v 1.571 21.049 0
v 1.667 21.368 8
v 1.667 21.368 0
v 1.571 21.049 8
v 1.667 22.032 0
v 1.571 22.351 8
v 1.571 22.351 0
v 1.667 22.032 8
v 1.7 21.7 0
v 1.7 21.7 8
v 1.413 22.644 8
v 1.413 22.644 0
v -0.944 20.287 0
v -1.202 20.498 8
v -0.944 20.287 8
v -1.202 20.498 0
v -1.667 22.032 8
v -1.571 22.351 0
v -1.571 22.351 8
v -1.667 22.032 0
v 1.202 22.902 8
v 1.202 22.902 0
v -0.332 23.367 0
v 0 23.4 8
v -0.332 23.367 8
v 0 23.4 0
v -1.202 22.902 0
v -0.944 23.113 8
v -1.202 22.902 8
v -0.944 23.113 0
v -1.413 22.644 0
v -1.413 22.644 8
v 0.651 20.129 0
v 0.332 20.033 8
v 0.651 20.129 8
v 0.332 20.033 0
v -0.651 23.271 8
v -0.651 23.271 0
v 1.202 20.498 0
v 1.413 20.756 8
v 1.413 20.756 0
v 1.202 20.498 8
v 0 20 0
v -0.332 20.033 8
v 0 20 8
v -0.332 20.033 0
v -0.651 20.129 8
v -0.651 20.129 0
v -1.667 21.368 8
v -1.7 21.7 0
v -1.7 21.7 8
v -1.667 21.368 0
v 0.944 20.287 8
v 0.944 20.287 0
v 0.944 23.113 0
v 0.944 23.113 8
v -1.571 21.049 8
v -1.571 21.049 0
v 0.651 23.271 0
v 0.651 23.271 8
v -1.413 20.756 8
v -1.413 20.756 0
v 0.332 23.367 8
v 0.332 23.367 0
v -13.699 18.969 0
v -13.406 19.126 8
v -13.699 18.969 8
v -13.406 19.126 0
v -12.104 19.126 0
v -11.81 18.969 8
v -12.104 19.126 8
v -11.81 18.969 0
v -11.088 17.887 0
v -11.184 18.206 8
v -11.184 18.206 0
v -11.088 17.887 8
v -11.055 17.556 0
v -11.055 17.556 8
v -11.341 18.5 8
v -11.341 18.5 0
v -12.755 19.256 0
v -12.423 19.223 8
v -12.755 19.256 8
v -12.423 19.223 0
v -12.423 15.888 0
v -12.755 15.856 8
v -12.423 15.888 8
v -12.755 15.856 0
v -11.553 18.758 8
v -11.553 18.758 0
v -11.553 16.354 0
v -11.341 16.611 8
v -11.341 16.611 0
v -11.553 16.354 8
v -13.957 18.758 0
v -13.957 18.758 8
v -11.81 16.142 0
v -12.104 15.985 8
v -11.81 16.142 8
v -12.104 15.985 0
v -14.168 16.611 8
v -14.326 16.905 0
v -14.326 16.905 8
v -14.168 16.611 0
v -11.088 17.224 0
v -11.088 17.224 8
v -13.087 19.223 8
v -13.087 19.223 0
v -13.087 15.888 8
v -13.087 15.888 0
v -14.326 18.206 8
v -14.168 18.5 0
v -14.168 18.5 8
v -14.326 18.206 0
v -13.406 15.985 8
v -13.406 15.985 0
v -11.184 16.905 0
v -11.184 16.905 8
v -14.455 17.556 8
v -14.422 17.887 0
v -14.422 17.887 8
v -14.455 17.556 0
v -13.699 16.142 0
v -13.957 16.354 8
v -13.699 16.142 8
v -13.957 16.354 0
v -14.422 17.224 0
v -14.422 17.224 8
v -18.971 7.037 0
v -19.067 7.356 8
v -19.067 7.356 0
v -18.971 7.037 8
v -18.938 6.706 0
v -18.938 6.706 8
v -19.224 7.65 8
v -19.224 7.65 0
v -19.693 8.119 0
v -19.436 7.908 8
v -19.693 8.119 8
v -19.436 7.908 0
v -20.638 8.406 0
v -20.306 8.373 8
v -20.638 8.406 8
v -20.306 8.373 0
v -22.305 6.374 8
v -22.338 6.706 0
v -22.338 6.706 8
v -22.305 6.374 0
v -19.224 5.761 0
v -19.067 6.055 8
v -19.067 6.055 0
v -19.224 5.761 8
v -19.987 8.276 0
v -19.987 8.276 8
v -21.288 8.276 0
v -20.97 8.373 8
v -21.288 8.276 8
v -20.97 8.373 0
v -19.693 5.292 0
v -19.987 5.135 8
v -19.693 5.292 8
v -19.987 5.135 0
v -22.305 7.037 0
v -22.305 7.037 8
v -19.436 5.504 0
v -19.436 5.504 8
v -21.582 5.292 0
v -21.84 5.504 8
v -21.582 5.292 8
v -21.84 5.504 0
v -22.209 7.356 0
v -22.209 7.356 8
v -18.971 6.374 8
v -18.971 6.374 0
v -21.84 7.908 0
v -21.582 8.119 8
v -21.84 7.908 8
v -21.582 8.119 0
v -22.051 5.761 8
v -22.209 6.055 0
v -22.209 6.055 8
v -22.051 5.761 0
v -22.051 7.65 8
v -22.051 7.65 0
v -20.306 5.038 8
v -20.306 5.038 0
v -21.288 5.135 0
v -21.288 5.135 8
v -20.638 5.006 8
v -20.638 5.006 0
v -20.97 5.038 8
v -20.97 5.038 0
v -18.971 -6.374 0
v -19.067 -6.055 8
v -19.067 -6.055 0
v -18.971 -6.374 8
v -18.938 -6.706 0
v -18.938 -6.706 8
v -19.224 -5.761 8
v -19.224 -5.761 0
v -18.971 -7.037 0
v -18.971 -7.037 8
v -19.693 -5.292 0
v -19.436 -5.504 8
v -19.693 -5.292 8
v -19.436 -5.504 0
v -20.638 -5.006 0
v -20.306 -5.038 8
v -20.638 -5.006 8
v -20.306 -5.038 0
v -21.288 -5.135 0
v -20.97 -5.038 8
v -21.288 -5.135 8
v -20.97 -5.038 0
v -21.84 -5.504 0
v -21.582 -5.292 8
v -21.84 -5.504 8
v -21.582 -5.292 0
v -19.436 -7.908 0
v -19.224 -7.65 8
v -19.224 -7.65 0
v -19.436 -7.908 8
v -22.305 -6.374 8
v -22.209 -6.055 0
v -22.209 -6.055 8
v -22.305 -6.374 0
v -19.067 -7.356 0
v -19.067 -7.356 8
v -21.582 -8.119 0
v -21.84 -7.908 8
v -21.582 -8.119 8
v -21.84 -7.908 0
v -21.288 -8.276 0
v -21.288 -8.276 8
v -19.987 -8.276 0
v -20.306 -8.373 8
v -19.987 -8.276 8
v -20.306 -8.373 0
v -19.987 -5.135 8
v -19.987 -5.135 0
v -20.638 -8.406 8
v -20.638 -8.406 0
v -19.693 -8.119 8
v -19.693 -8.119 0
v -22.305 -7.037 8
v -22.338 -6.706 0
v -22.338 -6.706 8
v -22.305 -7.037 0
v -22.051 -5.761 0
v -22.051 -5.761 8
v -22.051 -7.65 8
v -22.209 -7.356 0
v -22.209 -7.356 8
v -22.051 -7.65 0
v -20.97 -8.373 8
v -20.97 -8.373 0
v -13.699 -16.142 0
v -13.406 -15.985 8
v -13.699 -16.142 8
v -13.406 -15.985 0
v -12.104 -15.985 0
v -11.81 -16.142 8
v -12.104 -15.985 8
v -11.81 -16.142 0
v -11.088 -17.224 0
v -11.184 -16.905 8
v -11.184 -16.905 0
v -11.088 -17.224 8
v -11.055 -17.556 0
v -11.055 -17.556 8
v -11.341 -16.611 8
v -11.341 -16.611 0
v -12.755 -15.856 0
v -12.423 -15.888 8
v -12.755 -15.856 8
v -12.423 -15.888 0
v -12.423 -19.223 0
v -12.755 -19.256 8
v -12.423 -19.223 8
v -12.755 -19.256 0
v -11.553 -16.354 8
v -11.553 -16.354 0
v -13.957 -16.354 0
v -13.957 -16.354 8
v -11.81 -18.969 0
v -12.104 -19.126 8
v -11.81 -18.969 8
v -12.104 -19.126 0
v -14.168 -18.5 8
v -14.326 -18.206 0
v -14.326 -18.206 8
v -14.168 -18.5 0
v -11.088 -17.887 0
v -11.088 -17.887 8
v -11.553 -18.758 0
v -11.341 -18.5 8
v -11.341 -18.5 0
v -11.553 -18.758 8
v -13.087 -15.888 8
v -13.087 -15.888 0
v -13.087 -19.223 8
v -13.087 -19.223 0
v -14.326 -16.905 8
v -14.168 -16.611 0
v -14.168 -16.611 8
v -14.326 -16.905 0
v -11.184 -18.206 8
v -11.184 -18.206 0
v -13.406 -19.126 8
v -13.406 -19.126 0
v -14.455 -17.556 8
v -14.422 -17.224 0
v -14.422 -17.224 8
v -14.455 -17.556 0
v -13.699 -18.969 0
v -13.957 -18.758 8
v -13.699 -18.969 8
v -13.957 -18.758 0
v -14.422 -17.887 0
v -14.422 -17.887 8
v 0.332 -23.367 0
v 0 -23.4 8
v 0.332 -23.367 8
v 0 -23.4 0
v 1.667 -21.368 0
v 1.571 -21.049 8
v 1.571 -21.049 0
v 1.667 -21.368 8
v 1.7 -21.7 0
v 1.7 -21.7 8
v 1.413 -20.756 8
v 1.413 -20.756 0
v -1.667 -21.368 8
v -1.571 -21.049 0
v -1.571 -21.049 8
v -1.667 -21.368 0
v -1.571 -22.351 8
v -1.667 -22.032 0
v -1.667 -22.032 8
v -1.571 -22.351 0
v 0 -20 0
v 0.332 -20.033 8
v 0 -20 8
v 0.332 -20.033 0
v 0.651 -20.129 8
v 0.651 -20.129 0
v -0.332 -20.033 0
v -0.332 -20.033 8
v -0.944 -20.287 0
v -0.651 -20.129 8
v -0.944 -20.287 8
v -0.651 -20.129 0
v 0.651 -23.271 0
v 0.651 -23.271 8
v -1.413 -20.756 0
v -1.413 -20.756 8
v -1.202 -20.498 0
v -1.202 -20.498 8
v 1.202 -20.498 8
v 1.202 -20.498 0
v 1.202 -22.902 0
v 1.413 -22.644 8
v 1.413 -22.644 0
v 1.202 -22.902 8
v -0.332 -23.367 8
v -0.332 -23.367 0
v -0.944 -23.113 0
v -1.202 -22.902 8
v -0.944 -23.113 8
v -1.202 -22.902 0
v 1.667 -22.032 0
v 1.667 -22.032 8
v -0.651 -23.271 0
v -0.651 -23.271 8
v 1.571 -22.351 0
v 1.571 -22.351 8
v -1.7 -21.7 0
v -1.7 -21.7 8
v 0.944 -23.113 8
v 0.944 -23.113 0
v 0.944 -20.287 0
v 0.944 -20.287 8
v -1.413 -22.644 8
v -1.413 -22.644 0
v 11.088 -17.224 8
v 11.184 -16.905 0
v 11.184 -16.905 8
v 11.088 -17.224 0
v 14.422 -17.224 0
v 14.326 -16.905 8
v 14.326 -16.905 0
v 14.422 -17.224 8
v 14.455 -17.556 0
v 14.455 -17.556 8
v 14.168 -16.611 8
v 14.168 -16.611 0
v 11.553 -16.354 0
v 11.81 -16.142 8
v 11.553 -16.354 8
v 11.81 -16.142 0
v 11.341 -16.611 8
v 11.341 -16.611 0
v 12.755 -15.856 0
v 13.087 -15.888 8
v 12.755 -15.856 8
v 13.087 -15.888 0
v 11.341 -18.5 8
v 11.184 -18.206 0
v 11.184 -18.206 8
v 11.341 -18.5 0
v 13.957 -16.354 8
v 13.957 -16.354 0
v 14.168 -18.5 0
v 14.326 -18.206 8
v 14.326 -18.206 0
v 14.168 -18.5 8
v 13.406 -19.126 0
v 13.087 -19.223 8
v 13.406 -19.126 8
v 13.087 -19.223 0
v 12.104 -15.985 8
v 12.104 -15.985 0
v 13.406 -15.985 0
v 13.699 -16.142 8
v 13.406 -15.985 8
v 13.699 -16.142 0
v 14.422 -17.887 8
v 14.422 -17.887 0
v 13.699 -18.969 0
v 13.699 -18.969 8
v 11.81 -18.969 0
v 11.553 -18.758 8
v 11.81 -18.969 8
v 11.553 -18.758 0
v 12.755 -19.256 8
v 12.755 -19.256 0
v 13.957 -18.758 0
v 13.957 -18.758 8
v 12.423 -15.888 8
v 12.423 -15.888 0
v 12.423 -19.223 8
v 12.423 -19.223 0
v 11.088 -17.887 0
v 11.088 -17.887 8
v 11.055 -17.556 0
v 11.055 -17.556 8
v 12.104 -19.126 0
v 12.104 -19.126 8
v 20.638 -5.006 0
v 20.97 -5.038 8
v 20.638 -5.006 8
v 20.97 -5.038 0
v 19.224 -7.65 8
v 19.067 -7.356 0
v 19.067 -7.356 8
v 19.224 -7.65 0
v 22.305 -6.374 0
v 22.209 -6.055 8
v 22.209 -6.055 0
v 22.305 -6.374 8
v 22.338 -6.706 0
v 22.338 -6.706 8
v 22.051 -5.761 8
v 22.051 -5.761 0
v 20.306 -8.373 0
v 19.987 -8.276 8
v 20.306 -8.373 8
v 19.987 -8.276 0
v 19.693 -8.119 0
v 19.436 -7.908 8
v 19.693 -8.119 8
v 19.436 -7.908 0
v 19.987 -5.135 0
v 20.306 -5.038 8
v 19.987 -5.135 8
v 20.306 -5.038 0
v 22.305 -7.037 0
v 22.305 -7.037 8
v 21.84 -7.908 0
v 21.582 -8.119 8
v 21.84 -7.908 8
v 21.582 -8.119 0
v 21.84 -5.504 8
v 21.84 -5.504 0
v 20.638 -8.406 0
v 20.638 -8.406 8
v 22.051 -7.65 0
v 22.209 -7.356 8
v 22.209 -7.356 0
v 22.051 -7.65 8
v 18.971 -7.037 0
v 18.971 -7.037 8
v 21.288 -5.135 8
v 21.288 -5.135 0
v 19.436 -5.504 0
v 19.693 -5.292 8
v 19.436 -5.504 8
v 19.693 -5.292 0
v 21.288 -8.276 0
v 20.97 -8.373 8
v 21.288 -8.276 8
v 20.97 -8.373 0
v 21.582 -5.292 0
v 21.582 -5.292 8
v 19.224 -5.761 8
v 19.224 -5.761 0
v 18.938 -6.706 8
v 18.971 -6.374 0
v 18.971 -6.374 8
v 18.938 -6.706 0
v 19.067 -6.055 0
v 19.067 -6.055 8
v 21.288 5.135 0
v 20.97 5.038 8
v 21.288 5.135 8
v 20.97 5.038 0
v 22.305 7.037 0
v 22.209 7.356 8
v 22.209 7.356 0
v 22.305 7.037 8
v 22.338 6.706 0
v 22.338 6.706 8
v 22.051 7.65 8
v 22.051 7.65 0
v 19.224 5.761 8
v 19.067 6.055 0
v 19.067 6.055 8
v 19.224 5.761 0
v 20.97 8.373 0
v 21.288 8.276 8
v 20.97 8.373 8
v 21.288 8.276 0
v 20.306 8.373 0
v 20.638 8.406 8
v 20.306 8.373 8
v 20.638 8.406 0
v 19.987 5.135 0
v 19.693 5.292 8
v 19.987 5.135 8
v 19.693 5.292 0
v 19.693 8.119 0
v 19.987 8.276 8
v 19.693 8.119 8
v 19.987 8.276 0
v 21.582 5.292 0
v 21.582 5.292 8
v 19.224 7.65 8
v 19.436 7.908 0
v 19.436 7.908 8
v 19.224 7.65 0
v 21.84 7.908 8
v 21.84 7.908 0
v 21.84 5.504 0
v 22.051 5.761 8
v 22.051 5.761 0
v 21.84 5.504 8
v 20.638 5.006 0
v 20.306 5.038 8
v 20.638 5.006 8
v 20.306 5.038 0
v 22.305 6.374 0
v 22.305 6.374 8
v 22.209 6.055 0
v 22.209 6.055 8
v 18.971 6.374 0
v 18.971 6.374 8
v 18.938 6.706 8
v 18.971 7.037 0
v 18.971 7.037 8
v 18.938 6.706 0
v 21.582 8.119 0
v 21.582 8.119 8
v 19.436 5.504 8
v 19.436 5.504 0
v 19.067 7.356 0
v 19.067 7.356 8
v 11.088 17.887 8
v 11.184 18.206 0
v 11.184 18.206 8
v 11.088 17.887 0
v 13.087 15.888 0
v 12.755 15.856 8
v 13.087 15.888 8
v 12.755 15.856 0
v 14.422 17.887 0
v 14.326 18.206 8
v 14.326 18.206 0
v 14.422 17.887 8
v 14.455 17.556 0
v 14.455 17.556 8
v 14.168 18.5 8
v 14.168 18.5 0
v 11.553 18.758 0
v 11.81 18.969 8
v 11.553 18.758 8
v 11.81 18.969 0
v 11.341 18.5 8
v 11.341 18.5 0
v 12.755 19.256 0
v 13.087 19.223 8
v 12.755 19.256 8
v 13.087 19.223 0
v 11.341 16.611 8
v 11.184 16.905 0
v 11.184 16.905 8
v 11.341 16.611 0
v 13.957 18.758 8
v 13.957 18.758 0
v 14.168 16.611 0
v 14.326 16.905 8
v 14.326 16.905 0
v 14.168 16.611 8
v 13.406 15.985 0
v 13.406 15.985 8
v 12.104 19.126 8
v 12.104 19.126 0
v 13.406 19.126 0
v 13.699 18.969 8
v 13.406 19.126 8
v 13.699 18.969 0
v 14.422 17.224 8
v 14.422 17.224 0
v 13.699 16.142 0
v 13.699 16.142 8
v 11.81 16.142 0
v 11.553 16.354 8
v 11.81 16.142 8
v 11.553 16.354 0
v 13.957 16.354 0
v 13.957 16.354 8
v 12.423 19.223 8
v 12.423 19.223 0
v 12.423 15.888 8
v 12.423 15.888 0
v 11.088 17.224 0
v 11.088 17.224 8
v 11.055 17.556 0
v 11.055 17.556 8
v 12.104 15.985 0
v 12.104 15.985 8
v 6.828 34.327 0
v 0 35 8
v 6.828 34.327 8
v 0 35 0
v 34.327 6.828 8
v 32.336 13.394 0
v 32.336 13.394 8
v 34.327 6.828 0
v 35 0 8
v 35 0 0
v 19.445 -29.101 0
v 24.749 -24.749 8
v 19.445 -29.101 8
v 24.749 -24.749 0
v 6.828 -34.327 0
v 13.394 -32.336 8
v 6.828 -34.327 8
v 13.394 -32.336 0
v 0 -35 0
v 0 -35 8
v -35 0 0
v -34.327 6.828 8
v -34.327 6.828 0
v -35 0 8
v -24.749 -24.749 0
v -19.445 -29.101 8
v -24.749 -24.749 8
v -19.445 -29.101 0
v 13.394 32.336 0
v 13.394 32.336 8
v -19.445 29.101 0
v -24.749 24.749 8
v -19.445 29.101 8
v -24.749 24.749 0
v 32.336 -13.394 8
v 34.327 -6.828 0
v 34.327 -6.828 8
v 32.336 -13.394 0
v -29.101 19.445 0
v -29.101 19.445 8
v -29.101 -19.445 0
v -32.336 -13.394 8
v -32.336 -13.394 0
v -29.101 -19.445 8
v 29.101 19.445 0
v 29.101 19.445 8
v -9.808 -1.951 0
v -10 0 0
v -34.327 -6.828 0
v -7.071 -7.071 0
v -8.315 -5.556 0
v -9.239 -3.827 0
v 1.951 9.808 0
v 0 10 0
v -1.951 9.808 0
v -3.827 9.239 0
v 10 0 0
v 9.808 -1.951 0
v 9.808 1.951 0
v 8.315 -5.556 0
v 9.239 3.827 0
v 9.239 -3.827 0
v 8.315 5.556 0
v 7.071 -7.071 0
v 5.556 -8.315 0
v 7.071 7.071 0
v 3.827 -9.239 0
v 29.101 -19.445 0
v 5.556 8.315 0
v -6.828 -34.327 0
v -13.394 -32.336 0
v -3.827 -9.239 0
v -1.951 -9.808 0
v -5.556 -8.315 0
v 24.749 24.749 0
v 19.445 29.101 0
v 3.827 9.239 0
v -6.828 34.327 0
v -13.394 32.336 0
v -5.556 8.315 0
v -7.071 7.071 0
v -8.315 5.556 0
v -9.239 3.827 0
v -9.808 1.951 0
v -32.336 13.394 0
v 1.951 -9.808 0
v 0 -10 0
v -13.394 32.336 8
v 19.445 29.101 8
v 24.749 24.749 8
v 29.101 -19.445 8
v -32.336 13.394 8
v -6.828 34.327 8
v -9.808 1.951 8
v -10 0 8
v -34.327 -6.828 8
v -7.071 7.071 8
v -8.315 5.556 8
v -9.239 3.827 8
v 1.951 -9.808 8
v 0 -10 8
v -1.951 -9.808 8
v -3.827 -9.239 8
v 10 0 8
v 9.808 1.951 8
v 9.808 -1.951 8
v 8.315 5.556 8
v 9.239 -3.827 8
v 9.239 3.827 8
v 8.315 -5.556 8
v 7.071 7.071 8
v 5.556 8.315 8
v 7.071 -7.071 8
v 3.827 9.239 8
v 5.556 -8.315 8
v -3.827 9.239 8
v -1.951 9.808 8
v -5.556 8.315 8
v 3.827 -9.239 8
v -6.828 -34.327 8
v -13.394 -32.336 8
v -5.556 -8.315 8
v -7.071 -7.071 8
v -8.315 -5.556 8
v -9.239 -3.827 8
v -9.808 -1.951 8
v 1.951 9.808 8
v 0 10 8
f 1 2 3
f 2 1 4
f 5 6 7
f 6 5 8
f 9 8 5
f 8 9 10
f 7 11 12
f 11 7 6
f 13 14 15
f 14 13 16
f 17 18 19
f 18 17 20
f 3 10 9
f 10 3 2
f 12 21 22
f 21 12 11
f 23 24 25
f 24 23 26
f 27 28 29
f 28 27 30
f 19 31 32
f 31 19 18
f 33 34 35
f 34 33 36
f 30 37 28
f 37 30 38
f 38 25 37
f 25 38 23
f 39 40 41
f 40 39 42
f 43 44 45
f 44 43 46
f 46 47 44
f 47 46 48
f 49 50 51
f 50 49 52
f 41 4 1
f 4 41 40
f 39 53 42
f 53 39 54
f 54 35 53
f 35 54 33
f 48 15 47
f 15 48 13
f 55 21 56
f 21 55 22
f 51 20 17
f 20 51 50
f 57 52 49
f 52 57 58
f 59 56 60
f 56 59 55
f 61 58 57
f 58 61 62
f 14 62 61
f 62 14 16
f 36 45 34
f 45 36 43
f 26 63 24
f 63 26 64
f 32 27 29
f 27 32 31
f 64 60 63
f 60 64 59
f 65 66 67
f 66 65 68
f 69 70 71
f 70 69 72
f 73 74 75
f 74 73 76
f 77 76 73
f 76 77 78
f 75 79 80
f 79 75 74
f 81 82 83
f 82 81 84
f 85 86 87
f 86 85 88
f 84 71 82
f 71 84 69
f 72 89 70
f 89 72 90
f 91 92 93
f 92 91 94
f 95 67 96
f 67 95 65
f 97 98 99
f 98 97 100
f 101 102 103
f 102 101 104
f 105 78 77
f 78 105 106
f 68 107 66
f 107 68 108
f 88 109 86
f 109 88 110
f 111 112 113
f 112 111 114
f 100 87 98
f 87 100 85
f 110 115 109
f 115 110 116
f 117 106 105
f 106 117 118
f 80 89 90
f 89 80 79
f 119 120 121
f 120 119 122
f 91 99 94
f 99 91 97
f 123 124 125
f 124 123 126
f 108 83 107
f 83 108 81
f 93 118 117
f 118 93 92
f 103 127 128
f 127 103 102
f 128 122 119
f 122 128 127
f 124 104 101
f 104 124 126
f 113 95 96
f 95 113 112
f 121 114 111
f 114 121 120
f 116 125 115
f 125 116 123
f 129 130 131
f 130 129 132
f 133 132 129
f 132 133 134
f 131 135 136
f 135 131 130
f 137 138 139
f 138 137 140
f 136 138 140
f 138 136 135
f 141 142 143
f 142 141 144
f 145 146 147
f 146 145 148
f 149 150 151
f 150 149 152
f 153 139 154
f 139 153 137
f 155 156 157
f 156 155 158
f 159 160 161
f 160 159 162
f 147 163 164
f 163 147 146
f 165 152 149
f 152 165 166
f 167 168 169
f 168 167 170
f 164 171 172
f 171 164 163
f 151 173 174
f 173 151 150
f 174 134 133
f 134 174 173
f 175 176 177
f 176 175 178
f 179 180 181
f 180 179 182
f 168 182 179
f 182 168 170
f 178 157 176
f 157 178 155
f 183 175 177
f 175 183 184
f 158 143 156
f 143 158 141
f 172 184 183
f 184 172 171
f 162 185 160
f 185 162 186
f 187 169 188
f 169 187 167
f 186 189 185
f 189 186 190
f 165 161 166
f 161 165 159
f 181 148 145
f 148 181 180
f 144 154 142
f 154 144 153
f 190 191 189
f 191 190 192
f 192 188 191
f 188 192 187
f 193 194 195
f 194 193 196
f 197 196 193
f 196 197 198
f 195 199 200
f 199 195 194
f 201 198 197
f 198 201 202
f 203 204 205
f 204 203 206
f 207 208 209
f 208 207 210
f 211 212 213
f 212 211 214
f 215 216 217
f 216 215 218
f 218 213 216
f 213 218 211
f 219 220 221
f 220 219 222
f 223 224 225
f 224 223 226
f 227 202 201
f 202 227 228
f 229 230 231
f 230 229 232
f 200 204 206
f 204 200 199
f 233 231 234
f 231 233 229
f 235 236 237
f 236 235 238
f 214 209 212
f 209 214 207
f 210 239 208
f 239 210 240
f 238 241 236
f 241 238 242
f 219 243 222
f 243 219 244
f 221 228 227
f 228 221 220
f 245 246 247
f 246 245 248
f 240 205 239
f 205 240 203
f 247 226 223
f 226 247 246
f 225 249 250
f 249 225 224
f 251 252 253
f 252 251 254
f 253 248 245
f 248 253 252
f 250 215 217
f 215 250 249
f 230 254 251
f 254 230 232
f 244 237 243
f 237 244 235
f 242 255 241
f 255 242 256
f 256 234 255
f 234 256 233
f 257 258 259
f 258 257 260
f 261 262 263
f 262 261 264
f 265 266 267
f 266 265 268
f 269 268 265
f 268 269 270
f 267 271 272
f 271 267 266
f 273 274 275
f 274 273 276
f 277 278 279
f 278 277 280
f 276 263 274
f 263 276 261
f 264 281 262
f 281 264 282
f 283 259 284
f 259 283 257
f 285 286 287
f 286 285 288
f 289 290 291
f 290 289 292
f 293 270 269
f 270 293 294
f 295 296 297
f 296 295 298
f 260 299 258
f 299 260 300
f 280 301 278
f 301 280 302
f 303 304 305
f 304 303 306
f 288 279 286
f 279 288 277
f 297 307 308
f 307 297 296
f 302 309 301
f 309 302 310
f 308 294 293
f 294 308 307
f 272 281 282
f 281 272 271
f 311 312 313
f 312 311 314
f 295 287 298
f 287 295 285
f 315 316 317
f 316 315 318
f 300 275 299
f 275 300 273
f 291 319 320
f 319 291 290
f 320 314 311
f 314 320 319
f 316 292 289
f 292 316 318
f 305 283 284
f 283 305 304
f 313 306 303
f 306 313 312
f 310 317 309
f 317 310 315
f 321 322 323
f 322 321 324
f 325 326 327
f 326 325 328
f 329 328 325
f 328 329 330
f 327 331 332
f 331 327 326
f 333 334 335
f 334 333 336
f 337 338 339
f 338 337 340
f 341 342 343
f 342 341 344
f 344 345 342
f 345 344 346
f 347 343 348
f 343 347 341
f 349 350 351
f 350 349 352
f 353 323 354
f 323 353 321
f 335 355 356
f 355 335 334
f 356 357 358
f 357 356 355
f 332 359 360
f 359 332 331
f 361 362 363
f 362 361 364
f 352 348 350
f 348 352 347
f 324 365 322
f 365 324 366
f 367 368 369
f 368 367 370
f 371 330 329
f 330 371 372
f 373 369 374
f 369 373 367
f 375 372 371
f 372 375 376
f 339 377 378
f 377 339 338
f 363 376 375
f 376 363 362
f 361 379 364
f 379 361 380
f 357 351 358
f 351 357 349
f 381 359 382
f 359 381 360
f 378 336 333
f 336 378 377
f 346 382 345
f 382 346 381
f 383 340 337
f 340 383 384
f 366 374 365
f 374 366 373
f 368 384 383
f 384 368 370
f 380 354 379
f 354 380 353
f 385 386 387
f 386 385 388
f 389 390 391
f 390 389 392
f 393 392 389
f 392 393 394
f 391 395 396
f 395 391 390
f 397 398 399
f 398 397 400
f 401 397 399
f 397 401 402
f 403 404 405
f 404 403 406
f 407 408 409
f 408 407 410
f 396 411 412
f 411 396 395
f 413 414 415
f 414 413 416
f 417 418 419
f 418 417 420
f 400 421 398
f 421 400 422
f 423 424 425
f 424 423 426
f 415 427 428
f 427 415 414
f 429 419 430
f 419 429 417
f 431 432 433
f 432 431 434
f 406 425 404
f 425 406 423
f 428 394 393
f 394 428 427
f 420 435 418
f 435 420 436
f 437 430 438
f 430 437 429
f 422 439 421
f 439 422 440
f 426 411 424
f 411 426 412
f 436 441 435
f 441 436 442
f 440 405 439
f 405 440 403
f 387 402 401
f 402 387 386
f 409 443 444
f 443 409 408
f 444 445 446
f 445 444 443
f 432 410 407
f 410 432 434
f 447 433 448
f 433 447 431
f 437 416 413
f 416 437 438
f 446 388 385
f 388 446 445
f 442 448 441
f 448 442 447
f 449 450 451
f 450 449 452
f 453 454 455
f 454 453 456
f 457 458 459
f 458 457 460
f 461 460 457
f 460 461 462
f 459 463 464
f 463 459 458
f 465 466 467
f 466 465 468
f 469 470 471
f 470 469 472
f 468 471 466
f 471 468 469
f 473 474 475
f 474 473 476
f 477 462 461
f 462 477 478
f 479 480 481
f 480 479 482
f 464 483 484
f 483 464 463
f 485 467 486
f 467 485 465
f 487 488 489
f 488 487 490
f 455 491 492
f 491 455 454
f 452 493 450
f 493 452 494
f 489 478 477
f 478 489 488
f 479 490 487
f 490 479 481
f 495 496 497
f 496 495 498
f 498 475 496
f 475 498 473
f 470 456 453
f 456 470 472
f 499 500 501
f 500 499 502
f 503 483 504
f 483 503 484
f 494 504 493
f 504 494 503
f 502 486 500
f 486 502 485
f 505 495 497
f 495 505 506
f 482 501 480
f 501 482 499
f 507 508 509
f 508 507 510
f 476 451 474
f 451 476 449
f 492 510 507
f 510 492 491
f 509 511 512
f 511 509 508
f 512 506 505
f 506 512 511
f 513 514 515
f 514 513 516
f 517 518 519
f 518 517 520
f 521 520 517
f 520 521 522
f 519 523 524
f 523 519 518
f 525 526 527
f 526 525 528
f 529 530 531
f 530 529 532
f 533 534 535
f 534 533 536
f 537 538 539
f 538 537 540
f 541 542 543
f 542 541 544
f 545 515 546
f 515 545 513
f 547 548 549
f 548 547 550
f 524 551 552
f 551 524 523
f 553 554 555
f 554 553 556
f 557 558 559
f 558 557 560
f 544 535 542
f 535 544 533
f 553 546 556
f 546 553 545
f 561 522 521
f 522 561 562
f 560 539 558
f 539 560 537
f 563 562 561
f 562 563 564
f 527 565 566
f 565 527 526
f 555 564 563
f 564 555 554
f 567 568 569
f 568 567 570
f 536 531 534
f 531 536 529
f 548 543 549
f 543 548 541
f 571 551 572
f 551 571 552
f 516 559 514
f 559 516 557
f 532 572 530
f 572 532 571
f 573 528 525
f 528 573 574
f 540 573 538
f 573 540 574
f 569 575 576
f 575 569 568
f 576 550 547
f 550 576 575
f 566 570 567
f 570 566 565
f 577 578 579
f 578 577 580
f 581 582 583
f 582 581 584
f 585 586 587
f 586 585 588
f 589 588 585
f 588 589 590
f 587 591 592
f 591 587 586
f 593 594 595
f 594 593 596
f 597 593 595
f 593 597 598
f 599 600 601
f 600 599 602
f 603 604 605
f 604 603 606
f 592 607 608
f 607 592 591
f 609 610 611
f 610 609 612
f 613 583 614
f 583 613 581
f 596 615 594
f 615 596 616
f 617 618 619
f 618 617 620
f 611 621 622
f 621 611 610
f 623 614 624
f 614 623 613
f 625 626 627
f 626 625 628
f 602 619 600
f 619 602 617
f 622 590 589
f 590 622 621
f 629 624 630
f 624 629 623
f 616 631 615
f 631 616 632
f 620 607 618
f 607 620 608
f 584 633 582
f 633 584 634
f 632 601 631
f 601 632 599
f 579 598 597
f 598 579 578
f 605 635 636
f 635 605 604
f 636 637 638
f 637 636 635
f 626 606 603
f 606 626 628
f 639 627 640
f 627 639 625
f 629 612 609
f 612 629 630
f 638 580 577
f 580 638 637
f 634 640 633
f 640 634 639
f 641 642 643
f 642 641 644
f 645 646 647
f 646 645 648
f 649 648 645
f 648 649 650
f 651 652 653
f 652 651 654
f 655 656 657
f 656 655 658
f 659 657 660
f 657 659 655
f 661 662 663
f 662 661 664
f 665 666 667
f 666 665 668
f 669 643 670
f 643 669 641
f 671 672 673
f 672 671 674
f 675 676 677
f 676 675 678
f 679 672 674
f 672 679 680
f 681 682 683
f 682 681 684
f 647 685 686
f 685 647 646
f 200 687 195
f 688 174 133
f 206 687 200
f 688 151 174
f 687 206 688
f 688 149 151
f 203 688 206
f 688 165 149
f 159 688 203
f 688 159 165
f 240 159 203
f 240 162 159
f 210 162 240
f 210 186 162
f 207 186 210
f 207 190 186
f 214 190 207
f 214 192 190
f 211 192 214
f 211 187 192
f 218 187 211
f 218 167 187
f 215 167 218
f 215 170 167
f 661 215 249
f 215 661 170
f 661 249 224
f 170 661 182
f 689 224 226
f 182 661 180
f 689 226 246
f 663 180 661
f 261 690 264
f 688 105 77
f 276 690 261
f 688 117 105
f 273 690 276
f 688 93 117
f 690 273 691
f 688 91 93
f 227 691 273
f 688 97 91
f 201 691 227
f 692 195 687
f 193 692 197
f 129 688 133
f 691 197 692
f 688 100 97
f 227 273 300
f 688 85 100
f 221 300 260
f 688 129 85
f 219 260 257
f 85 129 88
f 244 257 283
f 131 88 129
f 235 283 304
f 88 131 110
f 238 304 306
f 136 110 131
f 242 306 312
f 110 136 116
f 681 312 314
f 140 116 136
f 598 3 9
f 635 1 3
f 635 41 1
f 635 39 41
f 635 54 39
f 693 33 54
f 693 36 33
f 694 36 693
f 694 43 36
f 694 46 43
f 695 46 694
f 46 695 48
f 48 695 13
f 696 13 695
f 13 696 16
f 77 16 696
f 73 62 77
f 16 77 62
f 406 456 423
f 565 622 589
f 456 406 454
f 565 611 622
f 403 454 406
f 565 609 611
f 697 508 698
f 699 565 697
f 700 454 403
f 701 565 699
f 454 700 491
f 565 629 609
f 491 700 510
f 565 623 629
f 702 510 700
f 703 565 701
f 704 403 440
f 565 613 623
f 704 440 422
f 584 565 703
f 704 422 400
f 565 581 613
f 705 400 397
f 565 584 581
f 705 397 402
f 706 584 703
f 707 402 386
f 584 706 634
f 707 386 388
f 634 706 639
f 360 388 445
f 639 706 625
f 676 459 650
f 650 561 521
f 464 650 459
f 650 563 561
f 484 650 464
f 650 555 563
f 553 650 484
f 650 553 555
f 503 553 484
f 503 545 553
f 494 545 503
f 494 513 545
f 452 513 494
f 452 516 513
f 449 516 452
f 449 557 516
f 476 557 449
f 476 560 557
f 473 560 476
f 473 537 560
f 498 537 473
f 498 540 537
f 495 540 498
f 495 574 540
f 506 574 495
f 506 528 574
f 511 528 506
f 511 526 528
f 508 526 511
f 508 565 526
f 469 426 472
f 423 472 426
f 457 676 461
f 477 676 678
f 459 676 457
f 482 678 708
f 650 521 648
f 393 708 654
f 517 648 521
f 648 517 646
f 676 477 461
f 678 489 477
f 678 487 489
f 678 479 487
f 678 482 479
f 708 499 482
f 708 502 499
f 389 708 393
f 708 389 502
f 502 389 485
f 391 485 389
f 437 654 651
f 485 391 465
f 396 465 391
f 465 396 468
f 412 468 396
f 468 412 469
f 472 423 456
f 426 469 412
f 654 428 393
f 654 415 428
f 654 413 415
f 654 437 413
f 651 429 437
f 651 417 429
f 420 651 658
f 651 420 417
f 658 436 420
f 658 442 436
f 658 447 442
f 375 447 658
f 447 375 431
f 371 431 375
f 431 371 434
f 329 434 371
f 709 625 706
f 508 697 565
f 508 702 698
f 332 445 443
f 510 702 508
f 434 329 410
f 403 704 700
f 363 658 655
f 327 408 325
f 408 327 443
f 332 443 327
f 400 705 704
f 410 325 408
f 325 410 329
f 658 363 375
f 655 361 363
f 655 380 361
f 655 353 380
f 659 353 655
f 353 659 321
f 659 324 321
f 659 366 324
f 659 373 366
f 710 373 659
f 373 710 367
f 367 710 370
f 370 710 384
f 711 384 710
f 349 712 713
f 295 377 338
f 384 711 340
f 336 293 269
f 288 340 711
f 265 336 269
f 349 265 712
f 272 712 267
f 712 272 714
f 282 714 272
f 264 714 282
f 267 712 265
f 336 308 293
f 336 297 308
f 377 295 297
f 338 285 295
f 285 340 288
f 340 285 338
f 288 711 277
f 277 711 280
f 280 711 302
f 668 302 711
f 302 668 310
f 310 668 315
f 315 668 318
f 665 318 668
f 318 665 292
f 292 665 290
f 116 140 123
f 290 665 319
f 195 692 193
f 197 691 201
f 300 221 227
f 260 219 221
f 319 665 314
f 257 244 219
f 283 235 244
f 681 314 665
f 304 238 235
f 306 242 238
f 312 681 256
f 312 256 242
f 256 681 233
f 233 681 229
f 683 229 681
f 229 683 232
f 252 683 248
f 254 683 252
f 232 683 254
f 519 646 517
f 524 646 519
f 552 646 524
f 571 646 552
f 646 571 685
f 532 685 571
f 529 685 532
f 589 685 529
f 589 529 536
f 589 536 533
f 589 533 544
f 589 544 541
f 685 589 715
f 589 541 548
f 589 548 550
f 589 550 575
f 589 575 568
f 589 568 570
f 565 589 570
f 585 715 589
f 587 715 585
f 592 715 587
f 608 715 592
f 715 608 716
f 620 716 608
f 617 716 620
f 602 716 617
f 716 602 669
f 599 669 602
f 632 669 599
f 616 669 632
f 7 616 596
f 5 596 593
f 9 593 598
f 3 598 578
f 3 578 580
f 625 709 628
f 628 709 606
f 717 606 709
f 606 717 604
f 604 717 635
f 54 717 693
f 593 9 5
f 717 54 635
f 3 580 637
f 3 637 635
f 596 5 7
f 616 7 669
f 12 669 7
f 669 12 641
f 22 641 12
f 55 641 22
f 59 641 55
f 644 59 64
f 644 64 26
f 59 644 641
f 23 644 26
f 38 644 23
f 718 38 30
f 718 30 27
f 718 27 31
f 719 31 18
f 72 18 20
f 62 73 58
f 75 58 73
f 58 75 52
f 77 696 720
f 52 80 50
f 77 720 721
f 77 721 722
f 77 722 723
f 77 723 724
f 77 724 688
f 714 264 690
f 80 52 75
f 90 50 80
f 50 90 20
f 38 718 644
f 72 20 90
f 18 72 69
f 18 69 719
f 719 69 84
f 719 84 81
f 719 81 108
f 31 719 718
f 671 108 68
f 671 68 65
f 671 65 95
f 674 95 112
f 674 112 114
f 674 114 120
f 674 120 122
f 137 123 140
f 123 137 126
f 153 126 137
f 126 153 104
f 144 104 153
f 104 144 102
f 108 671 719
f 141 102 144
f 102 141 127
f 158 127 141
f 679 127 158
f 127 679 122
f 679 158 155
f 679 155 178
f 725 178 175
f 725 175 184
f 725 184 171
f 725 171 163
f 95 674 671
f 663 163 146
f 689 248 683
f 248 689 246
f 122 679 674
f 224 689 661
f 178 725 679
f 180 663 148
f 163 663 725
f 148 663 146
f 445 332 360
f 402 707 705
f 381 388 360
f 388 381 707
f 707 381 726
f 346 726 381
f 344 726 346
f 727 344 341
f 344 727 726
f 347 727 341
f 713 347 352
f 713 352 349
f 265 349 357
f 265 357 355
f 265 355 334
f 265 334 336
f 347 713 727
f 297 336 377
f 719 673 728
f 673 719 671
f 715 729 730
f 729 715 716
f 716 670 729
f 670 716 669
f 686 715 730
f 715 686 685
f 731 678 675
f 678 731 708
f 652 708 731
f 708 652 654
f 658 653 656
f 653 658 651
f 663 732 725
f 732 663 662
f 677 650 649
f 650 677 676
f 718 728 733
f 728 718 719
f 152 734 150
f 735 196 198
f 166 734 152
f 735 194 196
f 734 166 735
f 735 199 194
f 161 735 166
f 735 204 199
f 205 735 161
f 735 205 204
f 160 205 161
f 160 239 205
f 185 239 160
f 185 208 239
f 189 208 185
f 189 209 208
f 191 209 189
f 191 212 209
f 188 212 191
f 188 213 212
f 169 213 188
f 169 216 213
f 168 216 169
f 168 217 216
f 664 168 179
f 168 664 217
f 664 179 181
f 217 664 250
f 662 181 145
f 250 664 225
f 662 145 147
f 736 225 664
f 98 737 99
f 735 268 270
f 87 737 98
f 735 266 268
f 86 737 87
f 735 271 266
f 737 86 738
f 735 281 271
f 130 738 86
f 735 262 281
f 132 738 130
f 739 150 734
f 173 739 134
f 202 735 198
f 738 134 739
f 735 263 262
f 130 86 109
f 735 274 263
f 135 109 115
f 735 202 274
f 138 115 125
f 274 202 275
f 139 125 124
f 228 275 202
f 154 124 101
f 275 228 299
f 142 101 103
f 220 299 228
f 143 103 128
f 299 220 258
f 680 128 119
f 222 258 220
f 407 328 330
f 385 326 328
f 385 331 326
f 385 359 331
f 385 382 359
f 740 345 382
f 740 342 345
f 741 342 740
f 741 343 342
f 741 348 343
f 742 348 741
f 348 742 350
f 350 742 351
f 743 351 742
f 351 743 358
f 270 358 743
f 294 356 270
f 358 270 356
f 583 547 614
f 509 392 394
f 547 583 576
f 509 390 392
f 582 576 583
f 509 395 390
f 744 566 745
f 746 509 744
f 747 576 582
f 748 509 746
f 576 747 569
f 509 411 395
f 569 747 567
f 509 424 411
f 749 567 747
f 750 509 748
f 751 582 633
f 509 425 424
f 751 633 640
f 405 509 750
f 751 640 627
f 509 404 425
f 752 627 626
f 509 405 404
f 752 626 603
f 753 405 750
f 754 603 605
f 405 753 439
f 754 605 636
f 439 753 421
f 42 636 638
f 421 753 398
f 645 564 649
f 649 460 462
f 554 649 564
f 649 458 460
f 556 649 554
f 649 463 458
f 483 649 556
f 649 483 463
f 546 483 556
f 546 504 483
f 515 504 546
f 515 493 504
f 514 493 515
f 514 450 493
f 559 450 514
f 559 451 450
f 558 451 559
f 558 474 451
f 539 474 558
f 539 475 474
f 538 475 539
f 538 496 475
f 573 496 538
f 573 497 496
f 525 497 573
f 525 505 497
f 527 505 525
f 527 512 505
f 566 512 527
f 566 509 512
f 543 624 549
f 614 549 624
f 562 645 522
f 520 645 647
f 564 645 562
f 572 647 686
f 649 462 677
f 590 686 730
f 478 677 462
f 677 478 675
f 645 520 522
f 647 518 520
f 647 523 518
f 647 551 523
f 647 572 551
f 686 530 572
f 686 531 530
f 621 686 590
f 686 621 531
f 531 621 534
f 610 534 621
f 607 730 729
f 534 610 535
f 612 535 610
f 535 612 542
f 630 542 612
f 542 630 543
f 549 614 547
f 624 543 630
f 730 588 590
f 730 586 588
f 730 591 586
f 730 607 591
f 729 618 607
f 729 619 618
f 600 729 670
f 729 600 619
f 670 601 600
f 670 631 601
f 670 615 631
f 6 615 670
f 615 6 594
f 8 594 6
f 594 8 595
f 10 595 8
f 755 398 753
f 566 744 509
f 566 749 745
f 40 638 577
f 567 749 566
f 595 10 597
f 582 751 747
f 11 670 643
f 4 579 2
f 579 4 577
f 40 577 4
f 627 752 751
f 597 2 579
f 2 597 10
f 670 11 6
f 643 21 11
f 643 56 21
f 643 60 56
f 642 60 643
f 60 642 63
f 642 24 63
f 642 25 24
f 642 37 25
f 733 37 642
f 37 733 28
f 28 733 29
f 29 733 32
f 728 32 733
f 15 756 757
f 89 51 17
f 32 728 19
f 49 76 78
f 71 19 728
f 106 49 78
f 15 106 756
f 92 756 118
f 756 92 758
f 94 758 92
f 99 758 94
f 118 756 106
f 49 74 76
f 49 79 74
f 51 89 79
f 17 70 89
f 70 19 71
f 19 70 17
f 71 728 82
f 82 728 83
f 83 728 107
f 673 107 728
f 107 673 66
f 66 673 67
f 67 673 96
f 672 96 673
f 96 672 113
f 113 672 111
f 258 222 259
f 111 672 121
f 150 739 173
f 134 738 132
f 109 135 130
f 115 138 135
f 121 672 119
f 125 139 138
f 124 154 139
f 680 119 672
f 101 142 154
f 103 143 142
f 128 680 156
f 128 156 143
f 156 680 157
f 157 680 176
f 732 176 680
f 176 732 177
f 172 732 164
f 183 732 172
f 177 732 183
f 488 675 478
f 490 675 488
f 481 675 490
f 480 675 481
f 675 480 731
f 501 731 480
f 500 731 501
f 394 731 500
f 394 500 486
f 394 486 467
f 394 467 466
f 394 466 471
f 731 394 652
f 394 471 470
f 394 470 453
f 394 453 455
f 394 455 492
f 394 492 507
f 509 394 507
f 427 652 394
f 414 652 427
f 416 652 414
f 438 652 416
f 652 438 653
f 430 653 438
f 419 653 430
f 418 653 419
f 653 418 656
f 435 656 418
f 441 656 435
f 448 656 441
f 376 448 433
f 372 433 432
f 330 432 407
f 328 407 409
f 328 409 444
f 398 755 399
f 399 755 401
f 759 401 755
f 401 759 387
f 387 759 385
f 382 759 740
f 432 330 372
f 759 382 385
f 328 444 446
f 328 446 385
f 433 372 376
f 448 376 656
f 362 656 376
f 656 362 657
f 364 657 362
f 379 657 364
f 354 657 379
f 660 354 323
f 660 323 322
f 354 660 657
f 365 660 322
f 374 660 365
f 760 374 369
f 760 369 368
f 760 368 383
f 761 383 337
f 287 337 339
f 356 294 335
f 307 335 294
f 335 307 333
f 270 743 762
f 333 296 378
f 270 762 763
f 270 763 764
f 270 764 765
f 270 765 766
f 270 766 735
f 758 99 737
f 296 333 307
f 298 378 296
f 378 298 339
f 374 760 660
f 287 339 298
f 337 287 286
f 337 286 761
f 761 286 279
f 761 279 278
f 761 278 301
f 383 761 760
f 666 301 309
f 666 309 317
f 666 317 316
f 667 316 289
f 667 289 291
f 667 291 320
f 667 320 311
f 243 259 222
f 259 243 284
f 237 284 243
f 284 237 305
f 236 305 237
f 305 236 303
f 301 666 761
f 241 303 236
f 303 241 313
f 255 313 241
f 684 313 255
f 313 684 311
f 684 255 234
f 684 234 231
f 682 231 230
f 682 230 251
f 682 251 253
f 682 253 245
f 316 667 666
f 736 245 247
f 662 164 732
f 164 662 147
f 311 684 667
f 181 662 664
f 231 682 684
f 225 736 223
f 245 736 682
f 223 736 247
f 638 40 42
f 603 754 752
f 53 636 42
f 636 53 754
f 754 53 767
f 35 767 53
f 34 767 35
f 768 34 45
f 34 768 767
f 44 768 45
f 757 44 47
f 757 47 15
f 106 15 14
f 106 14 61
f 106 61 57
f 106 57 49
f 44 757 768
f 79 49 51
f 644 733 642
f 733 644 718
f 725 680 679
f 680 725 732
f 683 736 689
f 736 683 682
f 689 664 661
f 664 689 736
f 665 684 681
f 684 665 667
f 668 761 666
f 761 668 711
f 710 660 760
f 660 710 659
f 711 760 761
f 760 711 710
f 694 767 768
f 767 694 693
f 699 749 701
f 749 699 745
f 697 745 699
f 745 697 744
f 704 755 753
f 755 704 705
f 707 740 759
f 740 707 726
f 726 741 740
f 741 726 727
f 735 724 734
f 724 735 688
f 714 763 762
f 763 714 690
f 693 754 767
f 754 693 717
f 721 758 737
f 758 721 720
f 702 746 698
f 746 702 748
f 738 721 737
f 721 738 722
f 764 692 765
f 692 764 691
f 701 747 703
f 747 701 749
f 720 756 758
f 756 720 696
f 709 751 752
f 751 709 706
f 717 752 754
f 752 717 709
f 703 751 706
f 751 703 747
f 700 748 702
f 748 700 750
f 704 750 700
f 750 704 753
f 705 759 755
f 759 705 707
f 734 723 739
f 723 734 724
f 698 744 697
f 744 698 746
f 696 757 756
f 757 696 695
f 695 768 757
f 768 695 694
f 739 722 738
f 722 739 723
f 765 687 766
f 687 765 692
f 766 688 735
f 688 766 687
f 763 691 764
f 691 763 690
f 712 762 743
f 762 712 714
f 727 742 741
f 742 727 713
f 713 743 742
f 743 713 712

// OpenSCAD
$fn = 32;

// ----------------------------------------------------------------------
// Flange Ø70 x 8
// 10 holes on a Ø43.4 bolt circle, bolted joints
// ----------------------------------------------------------------------

// --- parameters (mm) ---
flange_d = 70;   // outside diameter of the flange
thickness = 8;   // flange thickness
holes = 10;      // number of bolt holes
pcd = 43.4;      // bolt circle diameter
start_deg = 90;  // angle of the first hole, from +X
hole_d = 3.4;    // bolt hole diameter
bore_d = 20;     // central through bore
hub_d = 32;      // hub outside diameter
hub_h = 0;       // hub height above the flange face (0 = no hub)

// --- derived feature positions (mm) ---
height = thickness + hub_h;  // = 8   overall height of the part
pcd_r = pcd / 2;             // = 21.7   bolt circle radius
hole_step = 360 / holes;     // = 36   angular pitch
feature_centers = [
  [pcd_r * cos(start_deg + 0 * hole_step), pcd_r * sin(start_deg + 0 * hole_step)],
  [pcd_r * cos(start_deg + 1 * hole_step), pcd_r * sin(start_deg + 1 * hole_step)],
  [pcd_r * cos(start_deg + 2 * hole_step), pcd_r * sin(start_deg + 2 * hole_step)],
  [pcd_r * cos(start_deg + 3 * hole_step), pcd_r * sin(start_deg + 3 * hole_step)],
  [pcd_r * cos(start_deg + 4 * hole_step), pcd_r * sin(start_deg + 4 * hole_step)],
  [pcd_r * cos(start_deg + 5 * hole_step), pcd_r * sin(start_deg + 5 * hole_step)],
  [pcd_r * cos(start_deg + 6 * hole_step), pcd_r * sin(start_deg + 6 * hole_step)],
  [pcd_r * cos(start_deg + 7 * hole_step), pcd_r * sin(start_deg + 7 * hole_step)],
  [pcd_r * cos(start_deg + 8 * hole_step), pcd_r * sin(start_deg + 8 * hole_step)],
  [pcd_r * cos(start_deg + 9 * hole_step), pcd_r * sin(start_deg + 9 * hole_step)]
];   // bolt hole centres on the pitch circle

// flange disc, every hole and the bore cut straight through
difference() {
  union() {
    cylinder(d = flange_d, h = thickness);
  }
  translate([0, 0, -1]) cylinder(d = bore_d, h = height + 2);  // bore, through
  for (centre = feature_centers)
    translate([centre[0], centre[1], -1]) cylinder(d = hole_d, h = thickness + 2);
}
